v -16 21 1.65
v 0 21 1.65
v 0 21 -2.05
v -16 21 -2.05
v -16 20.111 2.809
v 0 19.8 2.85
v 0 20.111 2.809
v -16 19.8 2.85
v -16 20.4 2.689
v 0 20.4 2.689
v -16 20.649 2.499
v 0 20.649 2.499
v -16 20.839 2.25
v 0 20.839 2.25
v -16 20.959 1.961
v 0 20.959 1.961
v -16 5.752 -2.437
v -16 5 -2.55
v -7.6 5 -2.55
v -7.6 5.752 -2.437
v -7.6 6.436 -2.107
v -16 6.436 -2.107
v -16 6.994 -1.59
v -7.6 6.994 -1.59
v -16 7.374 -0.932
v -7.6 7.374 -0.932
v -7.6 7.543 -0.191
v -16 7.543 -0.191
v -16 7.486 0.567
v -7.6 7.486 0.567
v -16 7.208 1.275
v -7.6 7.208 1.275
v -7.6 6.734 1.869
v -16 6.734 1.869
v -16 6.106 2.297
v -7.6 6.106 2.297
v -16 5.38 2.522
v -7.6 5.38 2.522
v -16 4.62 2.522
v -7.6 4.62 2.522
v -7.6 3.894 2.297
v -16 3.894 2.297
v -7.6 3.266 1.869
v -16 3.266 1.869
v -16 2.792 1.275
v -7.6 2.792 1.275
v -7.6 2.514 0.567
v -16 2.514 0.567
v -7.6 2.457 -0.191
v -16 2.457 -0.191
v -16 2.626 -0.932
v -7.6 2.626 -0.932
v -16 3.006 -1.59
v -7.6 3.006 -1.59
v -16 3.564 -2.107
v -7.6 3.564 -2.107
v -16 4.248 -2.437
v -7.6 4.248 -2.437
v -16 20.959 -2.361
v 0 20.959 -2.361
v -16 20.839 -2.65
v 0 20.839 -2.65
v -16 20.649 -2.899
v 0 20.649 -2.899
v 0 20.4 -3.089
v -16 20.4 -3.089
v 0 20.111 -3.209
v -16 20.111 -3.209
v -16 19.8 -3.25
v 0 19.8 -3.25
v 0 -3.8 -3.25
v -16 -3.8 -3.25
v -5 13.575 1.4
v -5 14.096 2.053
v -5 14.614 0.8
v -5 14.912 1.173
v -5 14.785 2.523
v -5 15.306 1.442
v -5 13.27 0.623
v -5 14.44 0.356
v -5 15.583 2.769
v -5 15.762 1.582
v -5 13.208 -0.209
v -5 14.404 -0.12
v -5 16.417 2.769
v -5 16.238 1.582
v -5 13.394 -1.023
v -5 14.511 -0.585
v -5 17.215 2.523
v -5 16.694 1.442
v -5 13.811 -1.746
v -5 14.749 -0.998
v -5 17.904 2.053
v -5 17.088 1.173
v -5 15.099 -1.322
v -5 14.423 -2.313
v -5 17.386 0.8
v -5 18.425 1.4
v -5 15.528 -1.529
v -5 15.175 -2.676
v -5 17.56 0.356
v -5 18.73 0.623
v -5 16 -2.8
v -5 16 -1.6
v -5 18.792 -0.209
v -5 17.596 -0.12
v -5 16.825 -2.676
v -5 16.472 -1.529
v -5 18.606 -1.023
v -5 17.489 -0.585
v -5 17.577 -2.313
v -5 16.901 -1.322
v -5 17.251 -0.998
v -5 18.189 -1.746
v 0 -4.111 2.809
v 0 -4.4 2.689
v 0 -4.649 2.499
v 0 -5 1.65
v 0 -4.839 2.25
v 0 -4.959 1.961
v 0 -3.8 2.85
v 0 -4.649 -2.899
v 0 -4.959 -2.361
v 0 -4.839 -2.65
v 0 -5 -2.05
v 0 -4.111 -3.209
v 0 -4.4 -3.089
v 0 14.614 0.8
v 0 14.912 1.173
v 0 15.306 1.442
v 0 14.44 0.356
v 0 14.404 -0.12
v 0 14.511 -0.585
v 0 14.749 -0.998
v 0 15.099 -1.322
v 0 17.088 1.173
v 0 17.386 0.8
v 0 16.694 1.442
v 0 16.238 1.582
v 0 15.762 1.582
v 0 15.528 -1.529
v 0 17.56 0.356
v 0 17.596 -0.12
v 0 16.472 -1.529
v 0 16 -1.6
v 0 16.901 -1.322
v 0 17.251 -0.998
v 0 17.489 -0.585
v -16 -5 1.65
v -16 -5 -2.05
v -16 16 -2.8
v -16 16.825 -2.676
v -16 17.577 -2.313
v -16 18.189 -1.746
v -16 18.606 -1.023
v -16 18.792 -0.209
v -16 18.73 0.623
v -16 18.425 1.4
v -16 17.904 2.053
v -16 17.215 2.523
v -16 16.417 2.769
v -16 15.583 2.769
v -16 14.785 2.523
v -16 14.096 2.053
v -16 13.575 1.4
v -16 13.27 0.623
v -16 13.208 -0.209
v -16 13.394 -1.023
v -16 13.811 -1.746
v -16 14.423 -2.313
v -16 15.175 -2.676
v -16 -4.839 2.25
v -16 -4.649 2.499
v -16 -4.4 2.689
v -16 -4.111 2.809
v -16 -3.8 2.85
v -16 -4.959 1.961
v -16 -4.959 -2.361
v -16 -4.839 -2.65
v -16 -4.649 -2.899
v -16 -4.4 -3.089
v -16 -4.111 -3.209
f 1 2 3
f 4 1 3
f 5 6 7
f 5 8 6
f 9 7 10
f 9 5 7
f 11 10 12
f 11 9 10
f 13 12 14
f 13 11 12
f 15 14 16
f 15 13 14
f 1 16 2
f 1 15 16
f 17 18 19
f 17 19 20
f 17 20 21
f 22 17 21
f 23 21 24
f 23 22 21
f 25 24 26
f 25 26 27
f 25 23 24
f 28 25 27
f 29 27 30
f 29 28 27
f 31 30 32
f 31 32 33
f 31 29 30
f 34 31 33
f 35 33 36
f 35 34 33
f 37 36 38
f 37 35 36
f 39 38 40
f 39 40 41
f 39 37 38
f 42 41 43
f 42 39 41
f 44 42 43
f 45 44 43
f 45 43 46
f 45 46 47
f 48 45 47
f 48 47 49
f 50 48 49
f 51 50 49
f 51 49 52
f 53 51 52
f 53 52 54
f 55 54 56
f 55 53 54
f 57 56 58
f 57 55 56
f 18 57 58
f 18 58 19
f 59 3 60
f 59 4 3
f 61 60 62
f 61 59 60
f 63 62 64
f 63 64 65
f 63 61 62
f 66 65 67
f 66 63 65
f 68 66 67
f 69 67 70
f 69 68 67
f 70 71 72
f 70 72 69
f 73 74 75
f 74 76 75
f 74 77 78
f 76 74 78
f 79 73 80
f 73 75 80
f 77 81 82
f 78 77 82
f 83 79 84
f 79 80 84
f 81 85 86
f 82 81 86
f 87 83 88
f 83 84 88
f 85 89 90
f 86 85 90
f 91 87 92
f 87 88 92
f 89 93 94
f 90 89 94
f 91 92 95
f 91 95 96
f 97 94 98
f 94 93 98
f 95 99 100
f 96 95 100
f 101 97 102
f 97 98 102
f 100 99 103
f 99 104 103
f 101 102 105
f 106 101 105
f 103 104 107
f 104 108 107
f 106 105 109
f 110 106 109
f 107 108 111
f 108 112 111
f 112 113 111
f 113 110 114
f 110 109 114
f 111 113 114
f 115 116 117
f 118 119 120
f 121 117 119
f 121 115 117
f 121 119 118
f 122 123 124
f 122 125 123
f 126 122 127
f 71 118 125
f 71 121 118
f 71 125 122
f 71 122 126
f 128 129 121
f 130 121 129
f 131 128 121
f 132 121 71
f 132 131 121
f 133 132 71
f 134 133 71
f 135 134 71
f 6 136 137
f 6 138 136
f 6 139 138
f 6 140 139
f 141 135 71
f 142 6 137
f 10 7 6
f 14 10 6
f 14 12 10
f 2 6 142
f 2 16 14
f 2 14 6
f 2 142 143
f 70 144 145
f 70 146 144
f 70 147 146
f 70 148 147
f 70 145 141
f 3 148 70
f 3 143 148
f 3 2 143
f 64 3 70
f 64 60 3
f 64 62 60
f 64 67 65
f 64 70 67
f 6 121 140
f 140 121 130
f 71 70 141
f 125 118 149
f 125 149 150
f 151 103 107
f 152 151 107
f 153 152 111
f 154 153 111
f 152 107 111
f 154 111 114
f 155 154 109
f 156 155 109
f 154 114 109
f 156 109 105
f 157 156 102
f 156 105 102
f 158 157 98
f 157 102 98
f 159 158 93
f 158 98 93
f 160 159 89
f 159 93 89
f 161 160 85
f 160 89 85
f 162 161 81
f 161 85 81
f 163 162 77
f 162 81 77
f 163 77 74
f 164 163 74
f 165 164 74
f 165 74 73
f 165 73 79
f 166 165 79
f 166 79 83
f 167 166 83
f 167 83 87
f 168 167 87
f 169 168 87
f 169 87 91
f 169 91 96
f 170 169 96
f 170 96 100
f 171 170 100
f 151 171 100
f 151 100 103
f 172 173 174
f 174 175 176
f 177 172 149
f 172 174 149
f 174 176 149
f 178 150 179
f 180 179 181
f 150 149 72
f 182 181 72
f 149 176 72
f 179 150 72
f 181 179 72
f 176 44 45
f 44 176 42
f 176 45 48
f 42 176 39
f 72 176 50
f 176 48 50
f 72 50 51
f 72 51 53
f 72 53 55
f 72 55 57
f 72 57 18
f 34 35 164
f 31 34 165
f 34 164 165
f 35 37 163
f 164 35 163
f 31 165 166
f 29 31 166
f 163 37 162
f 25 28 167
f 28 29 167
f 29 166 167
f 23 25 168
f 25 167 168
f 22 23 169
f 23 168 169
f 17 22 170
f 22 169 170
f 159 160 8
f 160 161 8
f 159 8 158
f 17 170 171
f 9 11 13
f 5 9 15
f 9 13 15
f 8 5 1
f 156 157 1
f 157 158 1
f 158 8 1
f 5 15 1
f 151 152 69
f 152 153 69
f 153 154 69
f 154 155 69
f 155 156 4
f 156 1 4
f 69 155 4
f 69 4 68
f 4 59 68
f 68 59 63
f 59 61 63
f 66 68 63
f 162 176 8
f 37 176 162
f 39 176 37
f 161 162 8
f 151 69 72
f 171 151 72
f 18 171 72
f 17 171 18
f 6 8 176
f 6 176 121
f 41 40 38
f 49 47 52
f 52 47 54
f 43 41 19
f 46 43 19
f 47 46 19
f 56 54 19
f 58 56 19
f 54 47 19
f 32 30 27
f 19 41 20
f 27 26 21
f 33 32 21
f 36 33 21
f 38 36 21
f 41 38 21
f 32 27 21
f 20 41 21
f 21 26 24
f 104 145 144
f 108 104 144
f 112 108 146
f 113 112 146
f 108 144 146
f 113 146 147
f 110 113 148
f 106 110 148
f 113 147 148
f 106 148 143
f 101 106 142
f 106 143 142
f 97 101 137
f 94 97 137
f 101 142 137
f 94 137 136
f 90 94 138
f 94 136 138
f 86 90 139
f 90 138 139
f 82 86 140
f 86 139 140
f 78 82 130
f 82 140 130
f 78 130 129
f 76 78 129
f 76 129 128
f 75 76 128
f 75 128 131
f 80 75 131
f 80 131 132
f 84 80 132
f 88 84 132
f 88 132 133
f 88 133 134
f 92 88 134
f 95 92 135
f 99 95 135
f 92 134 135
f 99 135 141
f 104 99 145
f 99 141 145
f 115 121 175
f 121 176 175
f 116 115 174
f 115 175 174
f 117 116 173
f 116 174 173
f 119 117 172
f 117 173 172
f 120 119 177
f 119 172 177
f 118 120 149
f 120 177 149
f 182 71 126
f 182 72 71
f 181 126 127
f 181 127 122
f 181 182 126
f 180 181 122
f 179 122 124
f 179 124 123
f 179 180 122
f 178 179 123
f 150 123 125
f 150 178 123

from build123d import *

# Parameters (mm, degrees)
SKETCH1_W           = 6.5
SKETCH1_H           = 26
SKETCH1_R           = 2.8
BOSS_EXTRUDE1_DEPTH = 16
SKETCH1_3_R         = 2.8
SKETCH1_3_R_2       = 1.6
BOSS_EXTRUDE3_DEPTH = 5
CUT_EXTRUDE2_START  = -16
SKETCH1_4_R         = 2.55
CUT_EXTRUDE2_DEPTH  = 8.4
CUT_EXTRUDE1_START  = 3.25
SKETCH2_R           = 50
CUT_EXTRUDE1_DEPTH  = 0.4
FILLET1_R           = 1.2


with BuildPart() as part:
    # Sketch1 → Boss-Extrude1 (new body)
    with BuildSketch(Plane(origin=(0, 0, 0), x_dir=(0, 0, -1), z_dir=(1, 0, 0))):
        with Locations((0, 8)):
            Rectangle(SKETCH1_W, SKETCH1_H)
        with Locations((0, 16)):
            Circle(SKETCH1_R, mode=Mode.SUBTRACT)
    extrude(amount=-BOSS_EXTRUDE1_DEPTH)

    # Sketch1<3> → Boss-Extrude3 (add)
    with BuildSketch(Plane(origin=(0, 0, 0), x_dir=(0, 0, -1), z_dir=(1, 0, 0))):
        with Locations((0, 16)):
            Circle(SKETCH1_3_R)
        with Locations((0, 16)):
            Circle(SKETCH1_3_R_2, mode=Mode.SUBTRACT)
    extrude(amount=-BOSS_EXTRUDE3_DEPTH)

    # Sketch1<4> → Cut-Extrude2 (cut)
    with BuildSketch(Plane(origin=(0, 0, 0), x_dir=(0, 0, -1), z_dir=(1, 0, 0)).offset(CUT_EXTRUDE2_START)):
        with Locations((0, 5)):
            Circle(SKETCH1_4_R)
    extrude(amount=CUT_EXTRUDE2_DEPTH, mode=Mode.SUBTRACT)

    # Sketch2 → Cut-Extrude1 (cut)
    with BuildSketch(Plane.XY.offset(CUT_EXTRUDE1_START)):
        Circle(SKETCH2_R)
    extrude(amount=-CUT_EXTRUDE1_DEPTH, mode=Mode.SUBTRACT)

    # Fillet1
    fillet1_edges = [part.edges().sort_by_distance(p)[0] for p in [
        (-8, 21, -3.25),
        (-8, -5, -3.25),
        (-8, 21, 2.85),
        (-8, -5, 2.85),
    ]]
    fillet(fillet1_edges, radius=FILLET1_R)


solid = part.part
